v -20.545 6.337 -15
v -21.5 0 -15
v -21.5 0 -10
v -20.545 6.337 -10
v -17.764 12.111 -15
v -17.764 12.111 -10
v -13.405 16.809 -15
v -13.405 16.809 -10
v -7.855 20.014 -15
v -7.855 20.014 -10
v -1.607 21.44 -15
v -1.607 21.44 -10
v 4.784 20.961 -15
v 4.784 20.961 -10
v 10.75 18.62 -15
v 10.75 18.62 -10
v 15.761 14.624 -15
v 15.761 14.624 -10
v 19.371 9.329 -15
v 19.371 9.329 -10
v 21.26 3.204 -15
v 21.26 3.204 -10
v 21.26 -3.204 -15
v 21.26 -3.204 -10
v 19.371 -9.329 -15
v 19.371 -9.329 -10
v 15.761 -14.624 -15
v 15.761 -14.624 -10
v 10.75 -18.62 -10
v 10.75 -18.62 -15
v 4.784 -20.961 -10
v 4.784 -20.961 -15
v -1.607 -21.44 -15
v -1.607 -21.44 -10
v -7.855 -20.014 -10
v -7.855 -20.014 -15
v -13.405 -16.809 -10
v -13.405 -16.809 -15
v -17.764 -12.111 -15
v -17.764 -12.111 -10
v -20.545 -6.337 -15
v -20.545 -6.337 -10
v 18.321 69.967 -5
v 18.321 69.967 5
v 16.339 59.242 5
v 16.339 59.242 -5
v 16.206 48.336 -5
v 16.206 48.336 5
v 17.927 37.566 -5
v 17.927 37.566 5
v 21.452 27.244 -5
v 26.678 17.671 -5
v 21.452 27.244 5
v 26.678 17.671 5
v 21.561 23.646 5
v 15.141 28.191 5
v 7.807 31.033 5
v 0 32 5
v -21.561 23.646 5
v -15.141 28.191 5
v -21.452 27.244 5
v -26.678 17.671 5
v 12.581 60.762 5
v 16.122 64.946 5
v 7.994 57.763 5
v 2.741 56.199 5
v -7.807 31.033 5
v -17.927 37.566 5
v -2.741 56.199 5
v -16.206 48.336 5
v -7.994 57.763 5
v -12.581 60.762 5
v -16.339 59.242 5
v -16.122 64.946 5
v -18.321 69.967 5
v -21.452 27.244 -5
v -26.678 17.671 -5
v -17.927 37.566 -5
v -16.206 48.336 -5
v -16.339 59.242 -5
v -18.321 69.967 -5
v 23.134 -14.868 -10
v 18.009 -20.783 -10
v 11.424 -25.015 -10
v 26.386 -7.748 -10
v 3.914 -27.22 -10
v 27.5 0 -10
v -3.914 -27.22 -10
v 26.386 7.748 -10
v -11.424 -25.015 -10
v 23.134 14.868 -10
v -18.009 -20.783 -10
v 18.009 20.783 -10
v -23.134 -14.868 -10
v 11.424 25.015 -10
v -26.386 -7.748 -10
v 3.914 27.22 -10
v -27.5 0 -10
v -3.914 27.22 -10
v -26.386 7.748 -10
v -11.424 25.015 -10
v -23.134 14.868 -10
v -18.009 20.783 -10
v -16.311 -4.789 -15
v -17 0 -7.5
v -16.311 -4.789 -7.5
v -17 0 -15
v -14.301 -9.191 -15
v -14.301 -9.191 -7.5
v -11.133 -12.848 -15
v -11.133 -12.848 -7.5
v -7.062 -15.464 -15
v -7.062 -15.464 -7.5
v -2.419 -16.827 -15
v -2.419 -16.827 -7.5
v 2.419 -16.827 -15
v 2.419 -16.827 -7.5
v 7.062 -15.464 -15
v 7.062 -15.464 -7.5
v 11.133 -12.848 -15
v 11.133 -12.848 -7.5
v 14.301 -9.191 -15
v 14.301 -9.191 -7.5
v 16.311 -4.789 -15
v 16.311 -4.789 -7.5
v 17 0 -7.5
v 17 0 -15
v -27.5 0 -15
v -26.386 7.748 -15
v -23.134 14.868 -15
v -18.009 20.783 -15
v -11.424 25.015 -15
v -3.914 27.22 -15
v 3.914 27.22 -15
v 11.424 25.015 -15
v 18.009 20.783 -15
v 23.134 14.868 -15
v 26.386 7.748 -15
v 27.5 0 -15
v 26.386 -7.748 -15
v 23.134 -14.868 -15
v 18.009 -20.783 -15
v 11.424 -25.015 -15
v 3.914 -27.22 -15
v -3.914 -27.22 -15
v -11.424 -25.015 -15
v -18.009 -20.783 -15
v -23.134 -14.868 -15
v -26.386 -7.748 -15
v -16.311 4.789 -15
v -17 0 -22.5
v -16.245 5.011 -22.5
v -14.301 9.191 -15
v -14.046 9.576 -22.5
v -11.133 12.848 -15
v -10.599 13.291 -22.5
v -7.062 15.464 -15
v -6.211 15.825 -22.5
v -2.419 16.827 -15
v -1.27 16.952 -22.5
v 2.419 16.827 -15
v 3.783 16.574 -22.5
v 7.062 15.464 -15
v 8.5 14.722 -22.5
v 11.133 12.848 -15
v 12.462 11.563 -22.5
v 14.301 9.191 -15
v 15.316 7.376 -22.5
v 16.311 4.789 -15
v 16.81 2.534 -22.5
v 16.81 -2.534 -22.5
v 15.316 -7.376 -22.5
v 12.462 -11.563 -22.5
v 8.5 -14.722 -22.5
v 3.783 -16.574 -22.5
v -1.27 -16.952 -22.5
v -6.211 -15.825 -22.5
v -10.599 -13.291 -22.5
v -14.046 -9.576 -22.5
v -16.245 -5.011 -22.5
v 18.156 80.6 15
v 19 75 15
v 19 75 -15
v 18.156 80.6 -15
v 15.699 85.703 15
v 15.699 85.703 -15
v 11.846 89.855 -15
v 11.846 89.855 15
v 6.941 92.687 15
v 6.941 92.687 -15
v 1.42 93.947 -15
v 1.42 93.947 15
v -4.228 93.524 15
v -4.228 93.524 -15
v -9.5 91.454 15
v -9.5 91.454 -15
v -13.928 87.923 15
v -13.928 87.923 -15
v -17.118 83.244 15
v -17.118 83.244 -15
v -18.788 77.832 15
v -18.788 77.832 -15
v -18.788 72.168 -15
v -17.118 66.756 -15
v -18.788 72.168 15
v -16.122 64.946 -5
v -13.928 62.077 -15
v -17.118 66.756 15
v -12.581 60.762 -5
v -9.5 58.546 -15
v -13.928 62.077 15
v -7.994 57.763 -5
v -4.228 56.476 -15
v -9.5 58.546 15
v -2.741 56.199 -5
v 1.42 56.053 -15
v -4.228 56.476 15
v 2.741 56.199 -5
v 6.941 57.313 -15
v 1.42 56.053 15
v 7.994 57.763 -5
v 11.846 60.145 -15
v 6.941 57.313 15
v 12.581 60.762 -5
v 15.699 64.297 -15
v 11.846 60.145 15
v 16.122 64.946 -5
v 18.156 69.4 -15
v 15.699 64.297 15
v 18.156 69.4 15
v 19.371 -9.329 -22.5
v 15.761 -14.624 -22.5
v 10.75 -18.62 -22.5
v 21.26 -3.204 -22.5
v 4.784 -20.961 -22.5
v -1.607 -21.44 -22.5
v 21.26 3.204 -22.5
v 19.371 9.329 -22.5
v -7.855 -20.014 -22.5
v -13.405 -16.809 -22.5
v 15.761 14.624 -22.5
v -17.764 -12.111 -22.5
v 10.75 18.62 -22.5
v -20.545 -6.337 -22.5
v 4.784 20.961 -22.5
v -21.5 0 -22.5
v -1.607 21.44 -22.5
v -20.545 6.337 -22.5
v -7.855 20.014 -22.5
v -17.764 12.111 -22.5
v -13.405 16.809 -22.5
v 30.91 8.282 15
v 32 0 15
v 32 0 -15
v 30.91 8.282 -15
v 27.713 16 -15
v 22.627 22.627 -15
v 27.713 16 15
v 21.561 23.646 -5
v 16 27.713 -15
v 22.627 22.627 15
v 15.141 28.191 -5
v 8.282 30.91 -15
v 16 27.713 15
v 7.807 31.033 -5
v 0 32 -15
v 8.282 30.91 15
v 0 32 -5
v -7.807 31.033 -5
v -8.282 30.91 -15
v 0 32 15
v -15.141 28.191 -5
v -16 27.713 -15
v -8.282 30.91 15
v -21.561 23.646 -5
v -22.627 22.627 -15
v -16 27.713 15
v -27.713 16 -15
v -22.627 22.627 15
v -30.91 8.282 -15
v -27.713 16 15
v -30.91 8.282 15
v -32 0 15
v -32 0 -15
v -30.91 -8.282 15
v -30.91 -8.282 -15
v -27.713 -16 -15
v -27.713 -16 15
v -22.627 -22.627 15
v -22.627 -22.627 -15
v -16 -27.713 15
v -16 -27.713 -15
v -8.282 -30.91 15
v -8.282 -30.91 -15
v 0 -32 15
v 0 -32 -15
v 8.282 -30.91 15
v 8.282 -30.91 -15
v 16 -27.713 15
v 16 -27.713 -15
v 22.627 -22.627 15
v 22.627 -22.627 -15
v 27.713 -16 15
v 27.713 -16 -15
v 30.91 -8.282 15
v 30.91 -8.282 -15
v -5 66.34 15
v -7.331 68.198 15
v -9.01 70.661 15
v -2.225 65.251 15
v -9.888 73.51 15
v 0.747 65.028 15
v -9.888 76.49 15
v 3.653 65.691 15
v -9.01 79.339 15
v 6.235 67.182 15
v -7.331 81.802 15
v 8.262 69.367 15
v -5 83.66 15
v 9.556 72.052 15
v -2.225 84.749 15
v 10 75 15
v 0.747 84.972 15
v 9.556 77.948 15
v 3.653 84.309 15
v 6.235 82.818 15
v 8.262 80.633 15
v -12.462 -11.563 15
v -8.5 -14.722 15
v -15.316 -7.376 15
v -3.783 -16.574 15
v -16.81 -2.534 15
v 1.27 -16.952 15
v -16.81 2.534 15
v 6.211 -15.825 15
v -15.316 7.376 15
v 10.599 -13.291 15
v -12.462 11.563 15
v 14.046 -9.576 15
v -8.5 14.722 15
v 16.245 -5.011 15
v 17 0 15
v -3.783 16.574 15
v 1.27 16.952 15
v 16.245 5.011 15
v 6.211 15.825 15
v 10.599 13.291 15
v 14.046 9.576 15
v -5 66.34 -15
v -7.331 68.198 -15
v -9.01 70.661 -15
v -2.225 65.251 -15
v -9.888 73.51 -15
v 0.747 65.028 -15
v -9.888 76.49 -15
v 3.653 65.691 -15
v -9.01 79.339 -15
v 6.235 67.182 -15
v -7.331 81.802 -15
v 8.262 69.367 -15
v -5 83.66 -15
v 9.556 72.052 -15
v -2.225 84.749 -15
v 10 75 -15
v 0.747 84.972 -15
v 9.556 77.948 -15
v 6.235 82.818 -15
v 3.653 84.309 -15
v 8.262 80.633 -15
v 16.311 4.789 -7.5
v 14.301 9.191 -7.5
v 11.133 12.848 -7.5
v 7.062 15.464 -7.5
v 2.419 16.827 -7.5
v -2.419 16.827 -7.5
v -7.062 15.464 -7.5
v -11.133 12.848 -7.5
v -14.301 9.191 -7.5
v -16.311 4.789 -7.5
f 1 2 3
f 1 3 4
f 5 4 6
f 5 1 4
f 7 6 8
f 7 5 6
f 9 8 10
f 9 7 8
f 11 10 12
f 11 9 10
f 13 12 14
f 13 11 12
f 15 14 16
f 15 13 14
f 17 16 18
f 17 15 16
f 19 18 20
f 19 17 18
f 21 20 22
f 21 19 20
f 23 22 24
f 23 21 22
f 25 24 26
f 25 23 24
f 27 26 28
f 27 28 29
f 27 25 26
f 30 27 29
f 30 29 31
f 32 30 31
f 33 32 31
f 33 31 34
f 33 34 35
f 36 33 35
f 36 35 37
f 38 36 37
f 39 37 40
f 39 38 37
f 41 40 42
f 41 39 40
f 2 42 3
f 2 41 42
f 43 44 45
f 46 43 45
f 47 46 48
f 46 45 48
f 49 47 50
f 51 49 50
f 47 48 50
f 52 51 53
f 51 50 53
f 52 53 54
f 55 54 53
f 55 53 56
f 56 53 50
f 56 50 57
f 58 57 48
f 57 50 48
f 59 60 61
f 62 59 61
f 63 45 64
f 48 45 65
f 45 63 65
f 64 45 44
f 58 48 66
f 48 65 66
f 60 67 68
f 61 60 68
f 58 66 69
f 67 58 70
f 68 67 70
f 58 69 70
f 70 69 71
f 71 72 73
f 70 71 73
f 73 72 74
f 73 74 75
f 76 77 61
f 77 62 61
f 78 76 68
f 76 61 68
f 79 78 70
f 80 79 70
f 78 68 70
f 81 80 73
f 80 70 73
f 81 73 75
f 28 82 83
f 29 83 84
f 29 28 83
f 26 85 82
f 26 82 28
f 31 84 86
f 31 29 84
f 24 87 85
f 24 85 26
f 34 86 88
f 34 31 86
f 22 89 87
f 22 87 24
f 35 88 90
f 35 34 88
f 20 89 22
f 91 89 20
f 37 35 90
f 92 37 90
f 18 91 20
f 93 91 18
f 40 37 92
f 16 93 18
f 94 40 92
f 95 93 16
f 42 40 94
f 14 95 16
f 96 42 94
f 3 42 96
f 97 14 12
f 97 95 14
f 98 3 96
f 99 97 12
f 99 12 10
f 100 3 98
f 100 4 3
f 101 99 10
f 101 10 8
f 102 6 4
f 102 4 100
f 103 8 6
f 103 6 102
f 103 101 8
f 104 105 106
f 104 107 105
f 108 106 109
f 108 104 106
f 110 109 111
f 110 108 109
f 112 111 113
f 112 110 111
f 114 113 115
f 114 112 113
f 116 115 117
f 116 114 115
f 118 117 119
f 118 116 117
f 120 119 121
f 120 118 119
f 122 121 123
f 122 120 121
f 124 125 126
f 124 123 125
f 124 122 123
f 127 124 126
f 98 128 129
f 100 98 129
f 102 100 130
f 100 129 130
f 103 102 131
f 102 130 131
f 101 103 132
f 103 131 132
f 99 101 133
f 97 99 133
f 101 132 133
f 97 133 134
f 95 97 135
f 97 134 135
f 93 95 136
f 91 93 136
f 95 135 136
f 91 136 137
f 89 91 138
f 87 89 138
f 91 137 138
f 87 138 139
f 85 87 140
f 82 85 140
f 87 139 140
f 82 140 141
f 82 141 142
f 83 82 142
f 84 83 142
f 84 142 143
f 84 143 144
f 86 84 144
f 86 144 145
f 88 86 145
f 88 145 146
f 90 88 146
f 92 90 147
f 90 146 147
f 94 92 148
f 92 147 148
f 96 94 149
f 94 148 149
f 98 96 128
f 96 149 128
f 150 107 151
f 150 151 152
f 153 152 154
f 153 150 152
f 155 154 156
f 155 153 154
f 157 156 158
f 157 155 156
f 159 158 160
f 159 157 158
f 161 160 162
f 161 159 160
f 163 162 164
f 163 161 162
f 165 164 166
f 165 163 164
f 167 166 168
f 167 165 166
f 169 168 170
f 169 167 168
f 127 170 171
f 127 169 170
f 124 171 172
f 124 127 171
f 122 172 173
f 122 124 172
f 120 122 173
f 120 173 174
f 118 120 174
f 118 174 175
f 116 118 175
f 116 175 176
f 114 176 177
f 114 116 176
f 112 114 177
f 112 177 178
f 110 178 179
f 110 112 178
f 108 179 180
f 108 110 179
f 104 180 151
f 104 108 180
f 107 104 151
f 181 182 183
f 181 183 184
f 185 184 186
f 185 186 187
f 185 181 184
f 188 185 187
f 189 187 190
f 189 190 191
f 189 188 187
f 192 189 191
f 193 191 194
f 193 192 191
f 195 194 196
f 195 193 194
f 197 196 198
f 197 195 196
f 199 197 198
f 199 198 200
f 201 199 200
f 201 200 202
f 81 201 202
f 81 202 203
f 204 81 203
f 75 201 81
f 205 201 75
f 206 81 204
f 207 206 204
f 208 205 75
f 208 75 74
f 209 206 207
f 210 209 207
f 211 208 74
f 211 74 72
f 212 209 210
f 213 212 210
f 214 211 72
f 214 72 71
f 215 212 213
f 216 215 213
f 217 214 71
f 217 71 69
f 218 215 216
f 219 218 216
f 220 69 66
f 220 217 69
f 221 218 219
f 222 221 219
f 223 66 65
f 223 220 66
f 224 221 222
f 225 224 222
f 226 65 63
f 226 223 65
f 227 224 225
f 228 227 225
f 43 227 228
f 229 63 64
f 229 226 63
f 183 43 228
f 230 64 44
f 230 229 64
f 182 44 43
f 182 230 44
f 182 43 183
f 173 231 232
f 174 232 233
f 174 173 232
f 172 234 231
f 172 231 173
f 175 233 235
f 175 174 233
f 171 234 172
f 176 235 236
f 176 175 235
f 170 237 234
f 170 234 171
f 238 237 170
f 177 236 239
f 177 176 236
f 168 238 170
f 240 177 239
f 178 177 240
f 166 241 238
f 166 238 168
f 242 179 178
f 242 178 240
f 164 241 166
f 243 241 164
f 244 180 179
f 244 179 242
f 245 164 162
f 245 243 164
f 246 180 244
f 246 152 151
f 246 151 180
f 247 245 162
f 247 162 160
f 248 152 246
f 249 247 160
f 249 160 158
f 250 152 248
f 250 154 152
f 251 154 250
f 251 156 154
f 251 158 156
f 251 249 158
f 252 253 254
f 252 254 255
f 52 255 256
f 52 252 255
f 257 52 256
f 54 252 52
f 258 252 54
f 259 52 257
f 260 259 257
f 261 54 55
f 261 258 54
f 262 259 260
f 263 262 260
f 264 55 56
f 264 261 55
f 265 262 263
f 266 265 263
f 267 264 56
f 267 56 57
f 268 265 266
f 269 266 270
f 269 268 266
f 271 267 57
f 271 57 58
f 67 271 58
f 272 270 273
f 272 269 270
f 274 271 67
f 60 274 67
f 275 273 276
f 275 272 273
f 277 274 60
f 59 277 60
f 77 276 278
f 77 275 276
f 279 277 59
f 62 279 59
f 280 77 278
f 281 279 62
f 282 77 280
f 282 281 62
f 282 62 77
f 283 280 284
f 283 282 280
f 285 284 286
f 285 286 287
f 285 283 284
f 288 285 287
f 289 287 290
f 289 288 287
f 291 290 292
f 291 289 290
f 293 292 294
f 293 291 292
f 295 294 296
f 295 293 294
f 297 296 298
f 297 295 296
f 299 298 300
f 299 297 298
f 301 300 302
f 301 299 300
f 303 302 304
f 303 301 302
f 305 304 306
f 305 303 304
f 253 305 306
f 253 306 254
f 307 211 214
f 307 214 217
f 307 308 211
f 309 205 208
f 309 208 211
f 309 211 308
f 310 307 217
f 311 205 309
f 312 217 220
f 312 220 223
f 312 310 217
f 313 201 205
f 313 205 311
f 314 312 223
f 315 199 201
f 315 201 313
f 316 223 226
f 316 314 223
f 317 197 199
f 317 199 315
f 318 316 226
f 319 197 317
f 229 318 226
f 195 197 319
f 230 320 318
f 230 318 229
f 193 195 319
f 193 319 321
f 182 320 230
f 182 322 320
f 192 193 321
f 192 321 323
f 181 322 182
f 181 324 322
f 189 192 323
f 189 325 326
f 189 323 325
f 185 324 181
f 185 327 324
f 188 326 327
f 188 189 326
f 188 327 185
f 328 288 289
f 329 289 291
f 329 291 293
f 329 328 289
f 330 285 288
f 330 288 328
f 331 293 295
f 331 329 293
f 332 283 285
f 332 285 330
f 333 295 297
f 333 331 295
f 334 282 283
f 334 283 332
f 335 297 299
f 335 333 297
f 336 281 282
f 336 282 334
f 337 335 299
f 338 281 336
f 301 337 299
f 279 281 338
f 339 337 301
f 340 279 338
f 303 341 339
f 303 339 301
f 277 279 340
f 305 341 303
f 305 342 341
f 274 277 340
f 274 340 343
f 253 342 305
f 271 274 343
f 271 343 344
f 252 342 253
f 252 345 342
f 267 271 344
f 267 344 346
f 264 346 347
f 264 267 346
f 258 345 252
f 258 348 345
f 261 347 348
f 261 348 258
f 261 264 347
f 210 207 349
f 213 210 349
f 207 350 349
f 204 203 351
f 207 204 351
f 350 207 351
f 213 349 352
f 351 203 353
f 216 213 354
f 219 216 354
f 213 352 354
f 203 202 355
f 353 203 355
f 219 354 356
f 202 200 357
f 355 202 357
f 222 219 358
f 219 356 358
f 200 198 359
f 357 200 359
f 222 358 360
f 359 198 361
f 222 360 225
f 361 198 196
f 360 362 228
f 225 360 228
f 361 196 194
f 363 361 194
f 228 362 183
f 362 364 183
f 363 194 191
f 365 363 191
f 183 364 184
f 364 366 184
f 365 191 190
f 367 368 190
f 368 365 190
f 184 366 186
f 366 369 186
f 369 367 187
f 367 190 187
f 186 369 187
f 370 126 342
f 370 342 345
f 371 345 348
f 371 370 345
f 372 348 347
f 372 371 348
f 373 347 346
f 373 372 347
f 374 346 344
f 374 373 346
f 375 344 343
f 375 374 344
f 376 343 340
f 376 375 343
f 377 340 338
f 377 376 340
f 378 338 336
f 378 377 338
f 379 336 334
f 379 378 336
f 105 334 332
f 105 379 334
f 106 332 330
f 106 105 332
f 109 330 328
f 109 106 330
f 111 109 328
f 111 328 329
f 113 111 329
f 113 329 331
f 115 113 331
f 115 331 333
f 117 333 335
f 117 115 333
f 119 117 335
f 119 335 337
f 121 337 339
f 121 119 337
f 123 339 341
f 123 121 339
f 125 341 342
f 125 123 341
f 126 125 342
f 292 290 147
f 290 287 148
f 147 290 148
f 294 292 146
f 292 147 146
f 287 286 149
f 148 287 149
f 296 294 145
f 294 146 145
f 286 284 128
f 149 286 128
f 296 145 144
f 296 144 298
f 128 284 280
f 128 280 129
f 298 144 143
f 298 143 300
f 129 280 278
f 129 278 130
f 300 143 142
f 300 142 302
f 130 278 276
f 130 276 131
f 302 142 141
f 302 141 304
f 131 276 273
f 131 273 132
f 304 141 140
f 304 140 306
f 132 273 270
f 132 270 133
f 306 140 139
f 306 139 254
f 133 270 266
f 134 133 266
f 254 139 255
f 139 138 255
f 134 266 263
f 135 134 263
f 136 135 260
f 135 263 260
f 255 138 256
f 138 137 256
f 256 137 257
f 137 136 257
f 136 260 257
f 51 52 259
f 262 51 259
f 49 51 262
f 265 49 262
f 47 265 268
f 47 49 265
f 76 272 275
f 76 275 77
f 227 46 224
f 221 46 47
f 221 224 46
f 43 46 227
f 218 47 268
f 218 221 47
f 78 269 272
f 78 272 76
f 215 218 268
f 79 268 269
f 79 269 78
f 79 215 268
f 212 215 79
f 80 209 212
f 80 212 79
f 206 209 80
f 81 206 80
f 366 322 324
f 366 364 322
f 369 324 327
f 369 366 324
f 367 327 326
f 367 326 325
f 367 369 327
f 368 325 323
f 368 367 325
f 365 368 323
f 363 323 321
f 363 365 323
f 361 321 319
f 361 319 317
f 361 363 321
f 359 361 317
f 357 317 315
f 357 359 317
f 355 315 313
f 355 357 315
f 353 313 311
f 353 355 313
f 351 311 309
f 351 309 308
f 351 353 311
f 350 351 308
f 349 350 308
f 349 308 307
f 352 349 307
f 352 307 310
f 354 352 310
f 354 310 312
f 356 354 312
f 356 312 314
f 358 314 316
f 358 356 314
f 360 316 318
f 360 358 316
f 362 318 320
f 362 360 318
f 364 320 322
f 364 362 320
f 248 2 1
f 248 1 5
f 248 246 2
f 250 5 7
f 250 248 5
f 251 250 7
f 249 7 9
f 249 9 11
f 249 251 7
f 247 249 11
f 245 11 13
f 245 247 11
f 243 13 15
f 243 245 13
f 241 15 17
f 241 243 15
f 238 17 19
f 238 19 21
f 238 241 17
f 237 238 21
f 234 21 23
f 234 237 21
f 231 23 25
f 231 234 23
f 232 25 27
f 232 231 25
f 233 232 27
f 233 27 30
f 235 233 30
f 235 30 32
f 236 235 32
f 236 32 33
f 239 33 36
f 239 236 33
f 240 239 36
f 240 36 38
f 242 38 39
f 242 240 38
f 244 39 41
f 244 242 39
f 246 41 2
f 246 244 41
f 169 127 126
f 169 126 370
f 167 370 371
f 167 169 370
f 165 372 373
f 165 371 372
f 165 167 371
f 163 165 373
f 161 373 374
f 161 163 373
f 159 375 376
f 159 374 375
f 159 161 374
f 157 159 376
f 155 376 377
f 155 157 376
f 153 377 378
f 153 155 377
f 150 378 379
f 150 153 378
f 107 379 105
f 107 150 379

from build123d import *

# Parameters (mm, degrees)
ESQUISSE1_R             = 32
ESQUISSE1_R_2           = 17
BOSS_EXTRU_1_DEPTH      = 15
ESQUISSE1_R_3           = 19
ESQUISSE1_R_4           = 10
BOSS_EXTRU_1_2_DEPTH    = 15
BOSS_EXTRU_2_DEPTH      = 5
ESQUISSE3_R             = 27.5
ESQUISSE3_R_2           = 21.5
ENL_V_MAT_EXTRU_1_DEPTH = 5
ESQUISSE4_R             = 21.5
ESQUISSE4_R_2           = 17
BOSS_EXTRU_3_DEPTH      = 7.5


with BuildPart() as part:
    # Esquisse1 → Boss.-Extru.1 (new body, symmetric)
    with BuildSketch(Plane.XY):
        Circle(ESQUISSE1_R)
        Circle(ESQUISSE1_R_2, mode=Mode.SUBTRACT)
    extrude(amount=BOSS_EXTRU_1_DEPTH, both=True)



with BuildPart() as body_2:
    # Esquisse1 → Boss.-Extru.1 2 (new body, symmetric)
    with BuildSketch(Plane.XY):
        with Locations((0, 75)):
            Circle(ESQUISSE1_R_3)
        with Locations((0, 75)):
            Circle(ESQUISSE1_R_4, mode=Mode.SUBTRACT)
    extrude(amount=BOSS_EXTRU_1_2_DEPTH, both=True)


with BuildPart() as part_1:
    add(part.part)

    add(body_2.part)  # Boss.-Extru.2 merges body 2
    # Esquisse2 → Boss.-Extru.2 (add, symmetric)
    with BuildSketch(Plane.XY):
        with BuildLine():
            ThreePointArc((26.678302647, 17.671111111), (0, 32), (-26.678302647, 17.671111111))
            ThreePointArc((-26.678302647, 17.671111111), (-16.836772686, 42.914041255), (-18.321243986, 69.966907631))
            ThreePointArc((-18.321243986, 69.966907631), (0, 56), (18.321243986, 69.966907631))
            ThreePointArc((18.321243986, 69.966907631), (16.836772686, 42.914041255), (26.678302647, 17.671111111))
        make_face()
    extrude(amount=BOSS_EXTRU_2_DEPTH, both=True)

    # Esquisse3 → Enlèv. mat.-Extru.1 (cut)
    with BuildSketch(Plane(origin=(0, 0, -15), x_dir=(-1, 0, 0), z_dir=(0, 0, -1))):
        Circle(ESQUISSE3_R)
        Circle(ESQUISSE3_R_2, mode=Mode.SUBTRACT)
    extrude(amount=-ENL_V_MAT_EXTRU_1_DEPTH, mode=Mode.SUBTRACT)

    # Esquisse4 → Boss.-Extru.3 (add, symmetric)
    with BuildSketch(Plane(origin=(0, 0, -15), x_dir=(-1, 0, 0), z_dir=(0, 0, -1))):
        Circle(ESQUISSE4_R)
        Circle(ESQUISSE4_R_2, mode=Mode.SUBTRACT)
    extrude(amount=BOSS_EXTRU_3_DEPTH, both=True)


solid = part_1.part
